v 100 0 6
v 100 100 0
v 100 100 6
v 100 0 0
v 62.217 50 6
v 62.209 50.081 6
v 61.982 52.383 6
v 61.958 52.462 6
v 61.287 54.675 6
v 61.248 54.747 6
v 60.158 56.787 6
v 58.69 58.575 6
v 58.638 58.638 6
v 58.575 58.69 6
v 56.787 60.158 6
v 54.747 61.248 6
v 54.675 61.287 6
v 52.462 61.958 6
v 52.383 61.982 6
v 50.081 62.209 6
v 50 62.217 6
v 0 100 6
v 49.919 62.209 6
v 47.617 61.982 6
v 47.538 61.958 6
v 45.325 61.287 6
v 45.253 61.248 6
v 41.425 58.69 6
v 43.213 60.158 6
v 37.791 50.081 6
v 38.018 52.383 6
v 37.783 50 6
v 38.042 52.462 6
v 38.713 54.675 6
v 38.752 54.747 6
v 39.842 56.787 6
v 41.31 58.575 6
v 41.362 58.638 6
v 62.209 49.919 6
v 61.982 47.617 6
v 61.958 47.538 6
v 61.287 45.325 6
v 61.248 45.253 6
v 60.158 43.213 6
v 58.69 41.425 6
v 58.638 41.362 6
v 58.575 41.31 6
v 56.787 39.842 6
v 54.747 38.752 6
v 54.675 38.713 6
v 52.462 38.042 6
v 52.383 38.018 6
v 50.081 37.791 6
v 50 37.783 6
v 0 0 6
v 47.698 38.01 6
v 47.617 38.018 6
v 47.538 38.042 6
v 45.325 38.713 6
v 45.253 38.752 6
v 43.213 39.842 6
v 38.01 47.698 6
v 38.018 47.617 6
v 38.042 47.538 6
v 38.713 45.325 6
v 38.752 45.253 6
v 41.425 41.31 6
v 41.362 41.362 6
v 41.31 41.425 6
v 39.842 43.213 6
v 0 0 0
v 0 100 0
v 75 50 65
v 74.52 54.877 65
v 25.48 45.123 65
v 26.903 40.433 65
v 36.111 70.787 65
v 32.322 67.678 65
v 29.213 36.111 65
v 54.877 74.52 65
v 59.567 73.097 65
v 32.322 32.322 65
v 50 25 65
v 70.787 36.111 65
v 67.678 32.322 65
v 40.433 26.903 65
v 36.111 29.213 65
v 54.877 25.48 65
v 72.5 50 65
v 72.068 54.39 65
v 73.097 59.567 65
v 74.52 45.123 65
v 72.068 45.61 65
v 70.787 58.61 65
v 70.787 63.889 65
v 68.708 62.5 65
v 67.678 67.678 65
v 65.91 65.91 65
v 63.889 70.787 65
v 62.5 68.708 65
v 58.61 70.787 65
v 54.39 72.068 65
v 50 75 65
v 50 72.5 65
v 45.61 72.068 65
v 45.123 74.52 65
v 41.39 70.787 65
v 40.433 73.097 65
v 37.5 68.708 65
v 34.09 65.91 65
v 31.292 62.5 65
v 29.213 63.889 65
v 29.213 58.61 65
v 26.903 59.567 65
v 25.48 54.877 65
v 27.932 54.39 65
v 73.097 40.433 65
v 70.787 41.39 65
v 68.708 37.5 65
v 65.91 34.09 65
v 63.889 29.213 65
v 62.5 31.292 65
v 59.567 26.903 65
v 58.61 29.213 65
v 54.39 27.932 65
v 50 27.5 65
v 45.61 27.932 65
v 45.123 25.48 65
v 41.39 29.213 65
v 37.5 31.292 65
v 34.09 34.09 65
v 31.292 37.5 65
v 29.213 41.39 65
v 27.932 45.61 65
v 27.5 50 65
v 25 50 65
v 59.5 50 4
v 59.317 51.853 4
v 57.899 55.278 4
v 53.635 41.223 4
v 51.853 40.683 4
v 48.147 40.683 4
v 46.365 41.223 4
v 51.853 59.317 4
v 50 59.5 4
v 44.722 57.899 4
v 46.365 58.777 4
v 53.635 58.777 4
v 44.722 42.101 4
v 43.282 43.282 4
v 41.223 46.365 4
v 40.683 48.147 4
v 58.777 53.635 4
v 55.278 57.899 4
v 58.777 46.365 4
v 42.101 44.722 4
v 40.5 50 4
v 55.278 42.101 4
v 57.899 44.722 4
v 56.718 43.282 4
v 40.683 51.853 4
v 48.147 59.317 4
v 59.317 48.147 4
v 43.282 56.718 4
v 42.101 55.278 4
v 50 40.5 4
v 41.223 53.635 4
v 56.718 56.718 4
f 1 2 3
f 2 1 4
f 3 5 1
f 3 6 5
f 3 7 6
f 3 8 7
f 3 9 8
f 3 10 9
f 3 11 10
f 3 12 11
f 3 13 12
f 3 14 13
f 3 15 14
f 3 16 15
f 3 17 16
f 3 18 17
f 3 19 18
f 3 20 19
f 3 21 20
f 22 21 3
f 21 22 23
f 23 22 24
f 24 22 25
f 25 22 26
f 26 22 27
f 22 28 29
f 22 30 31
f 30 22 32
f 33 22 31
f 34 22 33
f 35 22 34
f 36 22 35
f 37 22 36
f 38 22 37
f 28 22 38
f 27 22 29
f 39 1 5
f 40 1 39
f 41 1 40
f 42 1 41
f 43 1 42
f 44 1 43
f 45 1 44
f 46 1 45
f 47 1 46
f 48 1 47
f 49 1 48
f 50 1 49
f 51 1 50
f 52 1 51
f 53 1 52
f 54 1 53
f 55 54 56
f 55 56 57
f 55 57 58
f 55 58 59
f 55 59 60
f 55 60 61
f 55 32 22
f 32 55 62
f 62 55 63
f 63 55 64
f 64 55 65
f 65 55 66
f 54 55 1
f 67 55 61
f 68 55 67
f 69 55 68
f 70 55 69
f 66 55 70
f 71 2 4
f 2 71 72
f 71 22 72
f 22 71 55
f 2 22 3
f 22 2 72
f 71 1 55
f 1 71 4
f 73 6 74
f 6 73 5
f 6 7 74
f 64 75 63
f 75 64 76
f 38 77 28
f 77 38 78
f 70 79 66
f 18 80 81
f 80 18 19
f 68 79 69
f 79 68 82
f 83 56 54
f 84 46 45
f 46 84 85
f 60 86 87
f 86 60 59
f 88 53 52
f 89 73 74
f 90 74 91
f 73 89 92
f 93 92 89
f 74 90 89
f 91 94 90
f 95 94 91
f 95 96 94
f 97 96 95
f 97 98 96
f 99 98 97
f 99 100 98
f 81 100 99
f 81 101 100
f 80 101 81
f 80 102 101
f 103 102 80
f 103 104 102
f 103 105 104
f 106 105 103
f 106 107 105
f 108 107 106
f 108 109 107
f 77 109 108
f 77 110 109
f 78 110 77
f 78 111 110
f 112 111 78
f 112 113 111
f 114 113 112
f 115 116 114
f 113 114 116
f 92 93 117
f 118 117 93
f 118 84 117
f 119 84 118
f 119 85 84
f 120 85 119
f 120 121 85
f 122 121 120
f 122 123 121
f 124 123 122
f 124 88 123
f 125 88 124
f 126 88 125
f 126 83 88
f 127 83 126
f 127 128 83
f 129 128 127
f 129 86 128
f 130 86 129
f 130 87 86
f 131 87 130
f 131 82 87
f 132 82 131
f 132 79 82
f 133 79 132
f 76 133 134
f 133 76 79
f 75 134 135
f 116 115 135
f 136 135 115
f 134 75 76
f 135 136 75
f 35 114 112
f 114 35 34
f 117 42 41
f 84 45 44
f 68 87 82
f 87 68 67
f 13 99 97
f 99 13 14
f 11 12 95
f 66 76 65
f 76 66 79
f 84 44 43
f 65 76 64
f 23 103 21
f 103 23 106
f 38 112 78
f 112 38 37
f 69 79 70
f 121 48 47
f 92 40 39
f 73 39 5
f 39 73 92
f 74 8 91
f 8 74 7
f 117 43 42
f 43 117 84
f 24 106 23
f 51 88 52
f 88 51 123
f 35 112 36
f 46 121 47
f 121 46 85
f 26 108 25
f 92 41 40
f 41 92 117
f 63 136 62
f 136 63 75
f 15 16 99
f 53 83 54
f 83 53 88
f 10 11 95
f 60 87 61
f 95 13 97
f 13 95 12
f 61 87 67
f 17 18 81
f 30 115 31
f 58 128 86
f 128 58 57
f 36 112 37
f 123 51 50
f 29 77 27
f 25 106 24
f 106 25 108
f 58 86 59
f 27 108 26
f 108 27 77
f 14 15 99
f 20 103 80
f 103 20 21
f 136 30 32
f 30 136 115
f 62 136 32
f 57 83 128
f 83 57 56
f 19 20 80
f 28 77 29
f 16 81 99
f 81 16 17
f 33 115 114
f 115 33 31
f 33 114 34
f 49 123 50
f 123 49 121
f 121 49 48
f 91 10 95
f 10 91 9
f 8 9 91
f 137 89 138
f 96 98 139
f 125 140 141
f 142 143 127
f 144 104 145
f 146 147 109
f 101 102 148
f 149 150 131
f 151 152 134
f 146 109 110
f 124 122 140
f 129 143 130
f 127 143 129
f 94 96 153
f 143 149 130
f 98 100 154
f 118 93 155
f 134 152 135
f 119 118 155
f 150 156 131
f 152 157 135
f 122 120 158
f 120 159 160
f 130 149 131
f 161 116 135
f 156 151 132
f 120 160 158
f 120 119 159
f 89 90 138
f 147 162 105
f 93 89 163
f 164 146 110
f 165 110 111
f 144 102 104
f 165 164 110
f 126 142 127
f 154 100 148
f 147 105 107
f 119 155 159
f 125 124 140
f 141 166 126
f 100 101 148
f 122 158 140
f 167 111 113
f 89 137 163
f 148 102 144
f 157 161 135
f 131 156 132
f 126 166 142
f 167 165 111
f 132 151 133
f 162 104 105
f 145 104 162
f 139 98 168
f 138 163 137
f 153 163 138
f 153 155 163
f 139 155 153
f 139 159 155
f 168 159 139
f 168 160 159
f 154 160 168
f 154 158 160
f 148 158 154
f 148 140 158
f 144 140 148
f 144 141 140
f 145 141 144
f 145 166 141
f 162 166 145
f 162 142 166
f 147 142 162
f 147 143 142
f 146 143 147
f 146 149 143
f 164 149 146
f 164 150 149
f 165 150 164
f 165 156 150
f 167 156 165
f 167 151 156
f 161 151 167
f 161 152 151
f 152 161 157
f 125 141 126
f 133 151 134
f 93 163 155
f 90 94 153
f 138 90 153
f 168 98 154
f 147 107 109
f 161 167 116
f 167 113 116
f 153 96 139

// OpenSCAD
$fn = 32;

// ----------------------------------------------------------------------
// Hopper: funnel with square flange
// ----------------------------------------------------------------------

// --- parameters (mm) ---
fl = 100;                 // flange side, X and Y
fl_t = 6;                 // flange thickness
cone_h = 60;              // cone height above the flange
top_d = 50;               // cone mouth diameter
bot_d = 24;               // cone spout diameter
wall = 2.5;               // cone wall thickness

bore_d = bot_d - 2 * wall;  // spout bore diameter
total_h = fl_t + cone_h - 1;  // overall height

difference() {
  union() {
    cube([fl, fl, fl_t]);
    translate([fl / 2, fl / 2, fl_t - 1])
      cylinder(h = cone_h, d1 = bot_d, d2 = top_d);
  }
  translate([fl / 2, fl / 2, fl_t - 2])
    cylinder(h = cone_h + 1, d1 = bore_d, d2 = top_d - 2 * wall);
}
